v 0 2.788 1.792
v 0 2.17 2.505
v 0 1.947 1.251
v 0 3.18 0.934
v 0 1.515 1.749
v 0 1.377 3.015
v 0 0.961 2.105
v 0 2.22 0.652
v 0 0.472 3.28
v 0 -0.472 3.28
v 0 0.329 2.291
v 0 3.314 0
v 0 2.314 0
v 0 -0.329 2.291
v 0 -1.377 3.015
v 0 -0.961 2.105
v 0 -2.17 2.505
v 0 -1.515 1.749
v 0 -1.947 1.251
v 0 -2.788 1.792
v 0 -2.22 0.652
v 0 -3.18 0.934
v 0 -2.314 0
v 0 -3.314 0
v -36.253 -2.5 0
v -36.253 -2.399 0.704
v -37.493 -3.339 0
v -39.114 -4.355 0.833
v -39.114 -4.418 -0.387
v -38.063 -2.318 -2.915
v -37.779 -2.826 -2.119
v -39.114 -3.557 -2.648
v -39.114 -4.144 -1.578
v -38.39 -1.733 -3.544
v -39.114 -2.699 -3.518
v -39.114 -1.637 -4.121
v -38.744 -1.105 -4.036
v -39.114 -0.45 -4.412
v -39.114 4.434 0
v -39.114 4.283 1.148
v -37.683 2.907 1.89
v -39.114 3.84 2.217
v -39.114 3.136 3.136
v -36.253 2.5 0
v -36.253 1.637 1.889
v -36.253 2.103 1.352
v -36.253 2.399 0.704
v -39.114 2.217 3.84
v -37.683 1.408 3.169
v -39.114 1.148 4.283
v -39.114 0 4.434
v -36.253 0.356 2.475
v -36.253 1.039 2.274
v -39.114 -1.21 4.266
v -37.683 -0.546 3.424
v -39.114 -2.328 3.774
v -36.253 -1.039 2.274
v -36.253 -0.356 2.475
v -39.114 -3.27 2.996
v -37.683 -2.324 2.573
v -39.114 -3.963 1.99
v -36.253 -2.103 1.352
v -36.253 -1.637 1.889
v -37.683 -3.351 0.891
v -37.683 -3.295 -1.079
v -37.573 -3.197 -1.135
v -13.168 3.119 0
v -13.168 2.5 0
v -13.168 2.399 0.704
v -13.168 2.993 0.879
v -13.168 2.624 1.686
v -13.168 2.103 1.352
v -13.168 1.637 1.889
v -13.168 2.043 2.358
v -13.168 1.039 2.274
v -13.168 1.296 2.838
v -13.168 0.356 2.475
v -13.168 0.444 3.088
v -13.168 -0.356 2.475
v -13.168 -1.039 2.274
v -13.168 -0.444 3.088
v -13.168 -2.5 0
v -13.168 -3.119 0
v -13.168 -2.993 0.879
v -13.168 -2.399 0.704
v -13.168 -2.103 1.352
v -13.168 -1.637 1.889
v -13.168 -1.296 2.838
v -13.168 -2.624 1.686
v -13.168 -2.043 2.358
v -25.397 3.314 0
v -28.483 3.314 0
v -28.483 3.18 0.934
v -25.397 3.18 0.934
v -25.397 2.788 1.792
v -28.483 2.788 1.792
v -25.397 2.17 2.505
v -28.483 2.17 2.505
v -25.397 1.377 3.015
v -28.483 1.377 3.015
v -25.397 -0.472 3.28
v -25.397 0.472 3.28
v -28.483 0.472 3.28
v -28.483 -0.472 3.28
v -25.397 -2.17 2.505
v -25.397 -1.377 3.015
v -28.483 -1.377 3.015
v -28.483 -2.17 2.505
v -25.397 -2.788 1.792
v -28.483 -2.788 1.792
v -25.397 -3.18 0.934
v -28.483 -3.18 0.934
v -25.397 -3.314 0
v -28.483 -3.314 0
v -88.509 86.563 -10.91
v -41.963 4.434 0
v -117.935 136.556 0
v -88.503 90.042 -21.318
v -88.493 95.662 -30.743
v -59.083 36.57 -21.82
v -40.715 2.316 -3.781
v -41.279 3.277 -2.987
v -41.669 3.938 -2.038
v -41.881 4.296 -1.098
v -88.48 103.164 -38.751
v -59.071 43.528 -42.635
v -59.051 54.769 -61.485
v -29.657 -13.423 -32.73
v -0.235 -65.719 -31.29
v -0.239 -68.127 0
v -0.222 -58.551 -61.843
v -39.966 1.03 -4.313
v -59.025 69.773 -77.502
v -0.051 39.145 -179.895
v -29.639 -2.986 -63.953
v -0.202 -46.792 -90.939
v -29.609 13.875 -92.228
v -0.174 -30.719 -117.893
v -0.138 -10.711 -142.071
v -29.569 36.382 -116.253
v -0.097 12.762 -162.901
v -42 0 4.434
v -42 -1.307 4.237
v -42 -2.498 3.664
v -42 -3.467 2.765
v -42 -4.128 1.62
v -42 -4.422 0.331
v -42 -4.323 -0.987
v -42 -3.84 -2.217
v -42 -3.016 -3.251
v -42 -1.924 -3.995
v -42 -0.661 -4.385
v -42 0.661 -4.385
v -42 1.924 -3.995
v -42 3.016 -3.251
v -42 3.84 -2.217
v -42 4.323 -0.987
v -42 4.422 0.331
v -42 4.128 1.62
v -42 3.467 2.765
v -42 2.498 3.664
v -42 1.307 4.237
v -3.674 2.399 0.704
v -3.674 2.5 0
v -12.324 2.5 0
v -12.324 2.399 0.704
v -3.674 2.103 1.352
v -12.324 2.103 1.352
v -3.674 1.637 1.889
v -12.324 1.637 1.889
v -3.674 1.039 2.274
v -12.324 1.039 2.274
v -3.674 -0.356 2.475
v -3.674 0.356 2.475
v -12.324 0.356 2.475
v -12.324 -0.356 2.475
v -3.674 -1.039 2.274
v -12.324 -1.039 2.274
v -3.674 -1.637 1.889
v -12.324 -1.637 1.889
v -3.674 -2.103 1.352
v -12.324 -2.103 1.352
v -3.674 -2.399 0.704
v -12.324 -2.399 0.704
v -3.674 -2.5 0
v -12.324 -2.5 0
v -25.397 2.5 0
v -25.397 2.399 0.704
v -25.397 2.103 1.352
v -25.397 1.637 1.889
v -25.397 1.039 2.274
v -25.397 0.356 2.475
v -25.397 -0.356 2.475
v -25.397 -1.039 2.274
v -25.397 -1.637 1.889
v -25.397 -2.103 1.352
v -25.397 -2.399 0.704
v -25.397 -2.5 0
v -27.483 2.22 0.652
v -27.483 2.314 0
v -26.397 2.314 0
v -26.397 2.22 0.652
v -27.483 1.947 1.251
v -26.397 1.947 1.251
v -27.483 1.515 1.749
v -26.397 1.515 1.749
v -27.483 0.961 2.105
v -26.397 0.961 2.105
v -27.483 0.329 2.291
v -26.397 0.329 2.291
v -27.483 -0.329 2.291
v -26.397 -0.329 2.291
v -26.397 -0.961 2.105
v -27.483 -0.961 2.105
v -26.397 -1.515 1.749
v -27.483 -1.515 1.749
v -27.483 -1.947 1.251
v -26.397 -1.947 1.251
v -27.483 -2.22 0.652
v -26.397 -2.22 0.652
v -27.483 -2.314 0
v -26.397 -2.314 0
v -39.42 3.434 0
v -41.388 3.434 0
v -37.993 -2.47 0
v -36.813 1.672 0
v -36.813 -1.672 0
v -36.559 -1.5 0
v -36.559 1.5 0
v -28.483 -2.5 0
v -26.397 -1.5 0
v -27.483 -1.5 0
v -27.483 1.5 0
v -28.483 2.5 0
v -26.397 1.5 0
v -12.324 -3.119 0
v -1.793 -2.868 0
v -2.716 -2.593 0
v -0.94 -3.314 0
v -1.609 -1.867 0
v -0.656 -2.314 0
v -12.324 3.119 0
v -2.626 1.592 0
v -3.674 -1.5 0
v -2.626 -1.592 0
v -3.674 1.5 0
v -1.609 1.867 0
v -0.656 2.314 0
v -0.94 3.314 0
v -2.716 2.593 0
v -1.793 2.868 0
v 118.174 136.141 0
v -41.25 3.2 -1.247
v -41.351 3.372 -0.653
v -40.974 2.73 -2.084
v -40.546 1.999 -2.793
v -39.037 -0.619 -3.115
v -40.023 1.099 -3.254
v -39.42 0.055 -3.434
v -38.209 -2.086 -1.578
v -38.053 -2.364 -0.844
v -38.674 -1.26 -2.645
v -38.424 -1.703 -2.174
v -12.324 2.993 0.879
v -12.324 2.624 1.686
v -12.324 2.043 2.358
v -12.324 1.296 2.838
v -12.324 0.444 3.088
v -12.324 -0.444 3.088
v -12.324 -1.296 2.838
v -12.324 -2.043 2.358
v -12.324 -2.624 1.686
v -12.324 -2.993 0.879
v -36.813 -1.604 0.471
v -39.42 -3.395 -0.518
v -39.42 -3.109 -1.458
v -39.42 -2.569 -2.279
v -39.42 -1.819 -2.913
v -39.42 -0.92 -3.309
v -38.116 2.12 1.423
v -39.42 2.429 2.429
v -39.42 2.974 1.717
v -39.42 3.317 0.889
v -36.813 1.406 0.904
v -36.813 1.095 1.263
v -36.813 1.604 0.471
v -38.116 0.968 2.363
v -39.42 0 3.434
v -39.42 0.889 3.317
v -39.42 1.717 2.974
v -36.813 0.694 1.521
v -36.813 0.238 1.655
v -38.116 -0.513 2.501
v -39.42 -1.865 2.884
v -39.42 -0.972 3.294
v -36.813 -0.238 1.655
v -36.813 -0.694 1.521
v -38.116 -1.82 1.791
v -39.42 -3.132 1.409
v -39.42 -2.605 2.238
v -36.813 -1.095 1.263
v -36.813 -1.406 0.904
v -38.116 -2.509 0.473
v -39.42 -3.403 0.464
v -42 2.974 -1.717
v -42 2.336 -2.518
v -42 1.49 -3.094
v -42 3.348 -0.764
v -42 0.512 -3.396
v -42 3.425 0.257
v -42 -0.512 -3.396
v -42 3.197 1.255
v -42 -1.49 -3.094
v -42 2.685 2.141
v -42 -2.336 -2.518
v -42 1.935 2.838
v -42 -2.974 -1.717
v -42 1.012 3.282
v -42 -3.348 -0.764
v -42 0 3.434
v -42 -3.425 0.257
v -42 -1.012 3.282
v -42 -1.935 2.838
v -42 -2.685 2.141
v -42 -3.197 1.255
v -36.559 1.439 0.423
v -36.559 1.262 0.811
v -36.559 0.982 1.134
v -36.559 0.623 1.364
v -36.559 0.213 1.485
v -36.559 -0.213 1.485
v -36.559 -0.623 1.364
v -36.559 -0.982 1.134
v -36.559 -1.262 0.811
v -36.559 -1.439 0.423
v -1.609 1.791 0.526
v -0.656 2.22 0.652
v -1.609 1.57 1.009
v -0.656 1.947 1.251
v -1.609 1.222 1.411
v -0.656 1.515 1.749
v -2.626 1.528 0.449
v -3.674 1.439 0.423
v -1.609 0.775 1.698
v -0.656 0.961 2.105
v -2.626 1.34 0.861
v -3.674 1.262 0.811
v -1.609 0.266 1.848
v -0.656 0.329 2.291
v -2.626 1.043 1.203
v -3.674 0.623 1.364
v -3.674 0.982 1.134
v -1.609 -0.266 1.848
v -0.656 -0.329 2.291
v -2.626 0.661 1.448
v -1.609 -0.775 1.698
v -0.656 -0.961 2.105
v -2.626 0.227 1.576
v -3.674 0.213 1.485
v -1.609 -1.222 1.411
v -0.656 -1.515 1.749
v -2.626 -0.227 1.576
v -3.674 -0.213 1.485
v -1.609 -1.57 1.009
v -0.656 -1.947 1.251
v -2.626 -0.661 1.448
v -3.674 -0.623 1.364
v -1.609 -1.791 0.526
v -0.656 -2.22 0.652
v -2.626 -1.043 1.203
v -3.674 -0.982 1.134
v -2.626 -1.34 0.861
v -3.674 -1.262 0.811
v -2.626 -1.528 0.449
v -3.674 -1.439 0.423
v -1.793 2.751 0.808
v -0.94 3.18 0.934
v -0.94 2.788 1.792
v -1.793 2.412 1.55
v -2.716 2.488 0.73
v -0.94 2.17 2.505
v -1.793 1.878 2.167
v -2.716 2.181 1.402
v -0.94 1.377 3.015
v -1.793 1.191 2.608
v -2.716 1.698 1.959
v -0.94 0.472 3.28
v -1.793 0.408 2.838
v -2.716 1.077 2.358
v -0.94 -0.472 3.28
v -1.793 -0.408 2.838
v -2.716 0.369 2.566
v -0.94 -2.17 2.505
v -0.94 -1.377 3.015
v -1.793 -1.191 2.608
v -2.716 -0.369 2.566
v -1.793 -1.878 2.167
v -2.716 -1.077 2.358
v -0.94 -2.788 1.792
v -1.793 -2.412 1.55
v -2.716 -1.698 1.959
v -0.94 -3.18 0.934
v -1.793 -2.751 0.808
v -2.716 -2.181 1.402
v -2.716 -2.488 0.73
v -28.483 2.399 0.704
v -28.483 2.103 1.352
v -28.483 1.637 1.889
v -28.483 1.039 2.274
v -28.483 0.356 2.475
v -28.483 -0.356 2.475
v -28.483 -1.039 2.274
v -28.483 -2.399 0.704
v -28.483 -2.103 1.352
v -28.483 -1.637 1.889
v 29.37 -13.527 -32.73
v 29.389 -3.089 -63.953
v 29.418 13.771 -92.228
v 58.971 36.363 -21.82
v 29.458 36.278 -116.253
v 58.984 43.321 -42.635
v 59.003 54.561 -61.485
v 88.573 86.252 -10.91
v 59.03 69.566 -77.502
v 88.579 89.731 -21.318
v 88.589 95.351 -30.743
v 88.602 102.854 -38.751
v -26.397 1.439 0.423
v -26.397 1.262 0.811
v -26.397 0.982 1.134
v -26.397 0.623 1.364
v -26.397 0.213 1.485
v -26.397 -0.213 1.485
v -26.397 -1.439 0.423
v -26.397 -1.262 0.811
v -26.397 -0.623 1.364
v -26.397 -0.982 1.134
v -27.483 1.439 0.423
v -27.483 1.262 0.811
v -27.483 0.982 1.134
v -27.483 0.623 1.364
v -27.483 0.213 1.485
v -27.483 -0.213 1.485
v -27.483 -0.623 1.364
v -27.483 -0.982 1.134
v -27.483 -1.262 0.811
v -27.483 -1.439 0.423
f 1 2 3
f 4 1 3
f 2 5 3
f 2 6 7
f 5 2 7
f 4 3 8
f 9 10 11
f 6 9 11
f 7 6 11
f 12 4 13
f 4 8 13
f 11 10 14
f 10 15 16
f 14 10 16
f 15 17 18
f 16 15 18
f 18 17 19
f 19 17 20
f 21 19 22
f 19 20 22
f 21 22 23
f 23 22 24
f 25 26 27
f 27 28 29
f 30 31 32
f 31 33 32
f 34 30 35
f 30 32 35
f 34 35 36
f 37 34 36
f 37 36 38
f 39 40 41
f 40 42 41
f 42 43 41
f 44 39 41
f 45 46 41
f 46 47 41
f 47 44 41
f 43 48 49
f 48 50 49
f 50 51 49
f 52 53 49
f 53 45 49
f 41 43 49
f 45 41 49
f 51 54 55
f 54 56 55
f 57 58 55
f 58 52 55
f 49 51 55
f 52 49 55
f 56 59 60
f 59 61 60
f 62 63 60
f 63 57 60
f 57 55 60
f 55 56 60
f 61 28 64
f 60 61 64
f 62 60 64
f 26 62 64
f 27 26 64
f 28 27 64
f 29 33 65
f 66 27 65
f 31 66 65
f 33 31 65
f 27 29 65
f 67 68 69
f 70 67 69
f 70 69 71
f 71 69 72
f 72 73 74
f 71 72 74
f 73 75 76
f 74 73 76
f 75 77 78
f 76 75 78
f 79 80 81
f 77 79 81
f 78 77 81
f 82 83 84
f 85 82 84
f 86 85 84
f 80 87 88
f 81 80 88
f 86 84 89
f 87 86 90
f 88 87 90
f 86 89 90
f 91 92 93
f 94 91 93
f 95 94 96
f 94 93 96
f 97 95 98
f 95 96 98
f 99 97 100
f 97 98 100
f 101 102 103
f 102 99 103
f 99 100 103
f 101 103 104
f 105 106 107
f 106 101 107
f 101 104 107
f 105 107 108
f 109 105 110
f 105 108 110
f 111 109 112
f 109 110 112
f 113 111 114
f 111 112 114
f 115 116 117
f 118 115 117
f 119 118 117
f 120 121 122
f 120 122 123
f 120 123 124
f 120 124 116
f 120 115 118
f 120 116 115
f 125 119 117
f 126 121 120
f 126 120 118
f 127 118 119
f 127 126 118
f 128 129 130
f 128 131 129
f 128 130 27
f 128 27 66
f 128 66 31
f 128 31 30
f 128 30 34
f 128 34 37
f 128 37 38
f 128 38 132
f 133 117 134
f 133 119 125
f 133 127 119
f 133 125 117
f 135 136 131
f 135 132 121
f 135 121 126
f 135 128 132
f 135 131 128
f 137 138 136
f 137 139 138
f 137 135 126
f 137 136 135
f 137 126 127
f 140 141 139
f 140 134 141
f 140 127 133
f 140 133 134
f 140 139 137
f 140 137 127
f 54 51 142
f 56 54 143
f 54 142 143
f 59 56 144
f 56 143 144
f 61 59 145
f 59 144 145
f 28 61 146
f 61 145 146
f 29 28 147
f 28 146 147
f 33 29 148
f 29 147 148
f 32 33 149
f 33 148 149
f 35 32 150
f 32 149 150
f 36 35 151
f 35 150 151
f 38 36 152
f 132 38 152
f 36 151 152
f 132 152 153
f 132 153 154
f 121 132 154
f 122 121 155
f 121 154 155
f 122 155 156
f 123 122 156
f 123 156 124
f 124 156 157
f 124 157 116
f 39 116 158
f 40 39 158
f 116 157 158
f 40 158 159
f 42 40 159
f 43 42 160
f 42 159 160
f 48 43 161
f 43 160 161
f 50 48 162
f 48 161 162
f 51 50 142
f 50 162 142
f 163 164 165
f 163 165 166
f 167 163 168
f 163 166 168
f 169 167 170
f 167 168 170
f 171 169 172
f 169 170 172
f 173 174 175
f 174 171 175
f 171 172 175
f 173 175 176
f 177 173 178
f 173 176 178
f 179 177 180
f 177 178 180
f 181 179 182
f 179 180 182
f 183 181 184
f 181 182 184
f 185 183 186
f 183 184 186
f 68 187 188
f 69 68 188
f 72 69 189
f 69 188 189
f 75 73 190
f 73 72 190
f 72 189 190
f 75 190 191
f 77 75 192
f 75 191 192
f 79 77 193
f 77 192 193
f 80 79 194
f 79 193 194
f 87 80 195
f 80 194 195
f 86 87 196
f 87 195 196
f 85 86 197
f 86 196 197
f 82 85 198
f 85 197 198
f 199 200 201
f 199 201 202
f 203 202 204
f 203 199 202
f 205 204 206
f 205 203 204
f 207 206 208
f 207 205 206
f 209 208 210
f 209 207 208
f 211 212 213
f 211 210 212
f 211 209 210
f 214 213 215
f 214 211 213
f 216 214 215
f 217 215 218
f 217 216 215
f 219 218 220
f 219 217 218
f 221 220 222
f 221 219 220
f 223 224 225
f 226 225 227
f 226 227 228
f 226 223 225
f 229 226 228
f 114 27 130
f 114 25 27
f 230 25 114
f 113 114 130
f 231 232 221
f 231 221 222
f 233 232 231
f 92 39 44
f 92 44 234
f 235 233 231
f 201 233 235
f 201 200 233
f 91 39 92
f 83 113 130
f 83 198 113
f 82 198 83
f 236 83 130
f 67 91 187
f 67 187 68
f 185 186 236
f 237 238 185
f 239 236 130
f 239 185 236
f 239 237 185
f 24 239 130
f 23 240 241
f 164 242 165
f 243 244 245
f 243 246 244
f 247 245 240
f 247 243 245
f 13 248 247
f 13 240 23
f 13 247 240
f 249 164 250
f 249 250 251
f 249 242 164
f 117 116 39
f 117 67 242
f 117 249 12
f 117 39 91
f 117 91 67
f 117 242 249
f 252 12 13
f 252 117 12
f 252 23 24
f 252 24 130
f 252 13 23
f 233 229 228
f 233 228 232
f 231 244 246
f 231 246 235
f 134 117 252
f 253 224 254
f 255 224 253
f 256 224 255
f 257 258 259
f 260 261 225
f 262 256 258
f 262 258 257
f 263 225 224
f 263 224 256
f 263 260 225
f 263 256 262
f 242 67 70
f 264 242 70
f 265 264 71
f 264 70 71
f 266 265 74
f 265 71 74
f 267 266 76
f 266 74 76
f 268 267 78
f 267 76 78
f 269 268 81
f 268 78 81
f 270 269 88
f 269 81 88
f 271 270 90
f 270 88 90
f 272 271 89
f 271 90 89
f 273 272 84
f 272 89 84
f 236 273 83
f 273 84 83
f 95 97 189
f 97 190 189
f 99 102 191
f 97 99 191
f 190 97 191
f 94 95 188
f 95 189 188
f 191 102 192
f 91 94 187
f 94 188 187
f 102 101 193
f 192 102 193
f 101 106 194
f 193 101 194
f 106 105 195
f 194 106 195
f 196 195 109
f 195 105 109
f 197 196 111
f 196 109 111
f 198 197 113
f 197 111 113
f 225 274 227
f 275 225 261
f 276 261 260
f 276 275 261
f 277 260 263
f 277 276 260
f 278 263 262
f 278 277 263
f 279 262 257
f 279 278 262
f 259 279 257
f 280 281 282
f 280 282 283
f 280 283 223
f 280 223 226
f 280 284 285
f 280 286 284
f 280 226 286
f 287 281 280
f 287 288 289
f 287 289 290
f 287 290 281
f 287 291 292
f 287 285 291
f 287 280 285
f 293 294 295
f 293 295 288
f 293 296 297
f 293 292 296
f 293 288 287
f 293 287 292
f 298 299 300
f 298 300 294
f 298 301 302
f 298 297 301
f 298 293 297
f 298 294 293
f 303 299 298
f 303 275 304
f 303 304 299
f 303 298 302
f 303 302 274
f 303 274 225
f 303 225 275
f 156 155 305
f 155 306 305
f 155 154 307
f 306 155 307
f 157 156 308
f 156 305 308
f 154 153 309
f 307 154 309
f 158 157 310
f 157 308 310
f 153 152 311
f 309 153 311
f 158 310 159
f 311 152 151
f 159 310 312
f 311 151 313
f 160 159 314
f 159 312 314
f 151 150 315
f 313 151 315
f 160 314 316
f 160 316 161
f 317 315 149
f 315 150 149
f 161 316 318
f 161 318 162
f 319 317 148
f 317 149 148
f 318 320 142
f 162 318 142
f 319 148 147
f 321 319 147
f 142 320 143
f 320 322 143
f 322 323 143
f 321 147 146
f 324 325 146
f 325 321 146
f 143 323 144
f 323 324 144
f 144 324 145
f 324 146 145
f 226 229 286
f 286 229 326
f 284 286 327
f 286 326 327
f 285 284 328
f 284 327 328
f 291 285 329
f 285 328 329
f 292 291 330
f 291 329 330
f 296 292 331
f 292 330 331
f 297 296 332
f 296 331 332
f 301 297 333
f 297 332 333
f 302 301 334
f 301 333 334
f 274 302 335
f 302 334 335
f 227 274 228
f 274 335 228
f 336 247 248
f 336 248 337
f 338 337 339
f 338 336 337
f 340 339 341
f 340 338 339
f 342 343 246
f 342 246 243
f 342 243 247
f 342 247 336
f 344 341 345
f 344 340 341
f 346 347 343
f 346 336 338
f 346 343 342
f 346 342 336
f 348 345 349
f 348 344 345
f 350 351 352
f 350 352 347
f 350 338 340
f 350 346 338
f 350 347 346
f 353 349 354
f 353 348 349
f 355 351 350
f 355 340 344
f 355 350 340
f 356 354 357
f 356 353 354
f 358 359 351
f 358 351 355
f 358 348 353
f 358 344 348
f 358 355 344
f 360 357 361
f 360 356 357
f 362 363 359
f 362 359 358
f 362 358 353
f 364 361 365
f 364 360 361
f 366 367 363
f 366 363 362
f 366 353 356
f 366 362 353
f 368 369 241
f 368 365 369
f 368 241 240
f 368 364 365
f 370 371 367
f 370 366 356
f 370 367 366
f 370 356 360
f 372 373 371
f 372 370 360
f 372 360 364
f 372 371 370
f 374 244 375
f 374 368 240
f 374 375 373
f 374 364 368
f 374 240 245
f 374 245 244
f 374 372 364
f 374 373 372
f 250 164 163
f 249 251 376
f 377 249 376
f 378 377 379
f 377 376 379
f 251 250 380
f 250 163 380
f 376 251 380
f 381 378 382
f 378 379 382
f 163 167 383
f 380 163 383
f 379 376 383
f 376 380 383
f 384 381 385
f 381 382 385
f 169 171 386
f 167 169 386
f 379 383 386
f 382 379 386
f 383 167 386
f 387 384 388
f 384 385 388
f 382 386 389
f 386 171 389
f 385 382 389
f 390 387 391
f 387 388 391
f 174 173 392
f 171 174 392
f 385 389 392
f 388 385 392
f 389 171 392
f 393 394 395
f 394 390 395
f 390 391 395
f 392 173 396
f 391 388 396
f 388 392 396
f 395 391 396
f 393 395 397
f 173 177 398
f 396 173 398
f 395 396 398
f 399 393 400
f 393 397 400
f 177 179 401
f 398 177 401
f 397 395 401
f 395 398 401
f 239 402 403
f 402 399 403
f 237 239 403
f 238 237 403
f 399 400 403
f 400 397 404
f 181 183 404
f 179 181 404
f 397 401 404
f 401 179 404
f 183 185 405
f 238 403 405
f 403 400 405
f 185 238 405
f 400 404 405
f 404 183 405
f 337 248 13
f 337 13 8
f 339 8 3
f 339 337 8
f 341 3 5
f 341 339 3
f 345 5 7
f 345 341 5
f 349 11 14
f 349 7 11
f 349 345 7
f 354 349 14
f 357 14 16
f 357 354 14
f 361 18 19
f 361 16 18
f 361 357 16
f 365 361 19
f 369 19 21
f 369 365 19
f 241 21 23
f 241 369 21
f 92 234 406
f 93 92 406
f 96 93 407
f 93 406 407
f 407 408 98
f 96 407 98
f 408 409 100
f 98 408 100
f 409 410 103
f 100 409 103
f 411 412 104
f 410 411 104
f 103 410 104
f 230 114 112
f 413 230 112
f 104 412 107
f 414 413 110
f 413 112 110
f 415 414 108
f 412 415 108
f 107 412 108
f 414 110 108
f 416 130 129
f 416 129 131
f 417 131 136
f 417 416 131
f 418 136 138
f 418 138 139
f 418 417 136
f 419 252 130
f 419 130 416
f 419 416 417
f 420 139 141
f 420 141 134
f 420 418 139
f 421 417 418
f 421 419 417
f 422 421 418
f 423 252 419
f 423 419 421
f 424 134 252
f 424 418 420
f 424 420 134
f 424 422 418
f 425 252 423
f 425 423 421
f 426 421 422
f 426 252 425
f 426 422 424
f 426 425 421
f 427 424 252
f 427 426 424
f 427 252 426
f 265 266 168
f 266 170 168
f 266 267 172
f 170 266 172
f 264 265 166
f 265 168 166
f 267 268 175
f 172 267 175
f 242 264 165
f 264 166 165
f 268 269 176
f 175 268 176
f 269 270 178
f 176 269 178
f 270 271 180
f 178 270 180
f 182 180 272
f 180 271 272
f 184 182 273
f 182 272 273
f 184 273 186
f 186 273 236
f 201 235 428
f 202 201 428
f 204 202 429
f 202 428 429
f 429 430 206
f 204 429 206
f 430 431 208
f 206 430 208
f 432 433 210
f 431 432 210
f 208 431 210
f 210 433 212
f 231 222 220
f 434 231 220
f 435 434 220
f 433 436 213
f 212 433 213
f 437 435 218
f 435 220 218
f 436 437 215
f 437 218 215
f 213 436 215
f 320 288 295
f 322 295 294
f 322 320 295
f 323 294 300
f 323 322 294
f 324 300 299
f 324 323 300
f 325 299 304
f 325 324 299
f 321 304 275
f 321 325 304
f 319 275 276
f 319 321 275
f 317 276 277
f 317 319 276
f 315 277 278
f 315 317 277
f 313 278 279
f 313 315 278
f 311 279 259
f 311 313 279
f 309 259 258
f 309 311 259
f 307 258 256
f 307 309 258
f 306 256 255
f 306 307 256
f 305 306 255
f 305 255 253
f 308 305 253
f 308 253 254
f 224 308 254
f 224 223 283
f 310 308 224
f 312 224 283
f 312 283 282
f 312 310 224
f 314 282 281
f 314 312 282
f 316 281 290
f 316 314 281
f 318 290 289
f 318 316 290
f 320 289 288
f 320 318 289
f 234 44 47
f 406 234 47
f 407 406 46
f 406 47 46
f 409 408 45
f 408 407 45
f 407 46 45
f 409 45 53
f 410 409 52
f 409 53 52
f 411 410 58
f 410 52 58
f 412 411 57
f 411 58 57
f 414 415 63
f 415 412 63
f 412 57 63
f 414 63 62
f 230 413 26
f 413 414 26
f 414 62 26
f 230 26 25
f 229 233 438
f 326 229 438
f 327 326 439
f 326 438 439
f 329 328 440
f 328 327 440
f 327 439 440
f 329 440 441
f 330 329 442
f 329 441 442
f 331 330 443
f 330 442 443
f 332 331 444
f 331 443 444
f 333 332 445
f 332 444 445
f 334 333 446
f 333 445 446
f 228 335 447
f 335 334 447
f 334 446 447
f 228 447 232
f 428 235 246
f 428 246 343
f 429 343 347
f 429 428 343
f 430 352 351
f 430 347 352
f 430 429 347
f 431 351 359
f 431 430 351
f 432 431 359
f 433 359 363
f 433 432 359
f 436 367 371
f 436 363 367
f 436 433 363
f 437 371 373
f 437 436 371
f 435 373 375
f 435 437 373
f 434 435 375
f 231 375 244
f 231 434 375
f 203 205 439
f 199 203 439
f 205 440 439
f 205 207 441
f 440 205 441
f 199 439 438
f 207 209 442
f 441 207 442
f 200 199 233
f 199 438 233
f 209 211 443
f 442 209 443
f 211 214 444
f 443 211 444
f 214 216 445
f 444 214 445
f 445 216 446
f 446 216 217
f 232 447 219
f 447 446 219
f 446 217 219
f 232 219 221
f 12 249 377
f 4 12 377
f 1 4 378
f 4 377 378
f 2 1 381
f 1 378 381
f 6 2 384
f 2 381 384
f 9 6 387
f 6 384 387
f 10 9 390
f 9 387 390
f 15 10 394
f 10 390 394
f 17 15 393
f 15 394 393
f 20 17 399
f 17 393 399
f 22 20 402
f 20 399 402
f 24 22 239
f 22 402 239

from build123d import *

# Parameters (mm, degrees)
F5_T     = 1
F7_ANGLE = 61.6159971065


# Not quite as in the source:
# - a fillet or chamfer that OpenCascade refuses, or shapes differently, is made with other operations: its cross-section is extruded or revolved along the edge and cut away or added
# - a feature of the source that left no trace in its solid (it failed there, or was rolled back) is left out
# - a shell that OpenCascade refuses in one call is made with other operations: the cavity is built on its own and cut out


with BuildPart() as f1:
    # F0 (on Front) → F1 (revolve)
    with BuildSketch(Plane.XZ):
        Polygon((-42, 4.4344547205), (-42, 0), (0, 0), (0, 3.3141644672), (-0.939540565, 3.3141644672), (-0.939540565, 2.5), (-12.3243089765, 2.5), (-12.3243089765, 3.1194374897), (-13.1681719795, 3.1194374897), (-13.1681719795, 2.5), (-25.396803394, 2.5), (-25.396803394, 3.3141644672), (-28.4831486642, 3.3141644672), (-28.4831486642, 2.5), (-36.2527966499, 2.5), (-39.1136556864, 4.4344547205), align=None)
    revolve(axis=Axis((-21, 0, 0), (1, 0, 0)))

    # F4: fillet of radius 5 on 1 edges, made by hand

    # F4_s1 → F4_t2 (revolve)
    with BuildSketch(Plane.XZ):
        with BuildLine():
            ThreePointArc((-0.939540565, 3.3141644672), (-2.2475981784, 2.7078617683), (-3.6742765472, 2.5))
            Line((-3.6742765472, 2.5), (-0.939540565, 2.5))
            Line((-0.939540565, 2.5), (-0.939540565, 3.3141644672))
        make_face()
    revolve(axis=Axis((-0.939540565, 0, 0), (1, 0, 0)))

    # F5: shell of thickness 1, made by hand


with BuildPart() as f5_core1:
    # F5_t2: copy of F1
    add(f1.part)

    # the walls: a layer under each face that stays
    f5_faces = [f5_core1.faces().sort_by_distance(p)[0] for p in [
        (-40.5568278432, 0, -4.4344547205),
        (-37.6832261682, 0, -3.4672273602),
        (-32.3679726571, 0, -2.5),
        (-28.4831486642, 2.2094429781, -2.2094429781),
        (-26.9399760291, 0, -3.3141644672),
        (-25.396803394, 2.2094429781, 2.2094429781),
        (-19.2824876867, 0, -2.5),
        (-13.1681719795, 2.0796249931, -2.0796249931),
        (-12.746240478, 0, -3.1194374897),
        (-12.3243089765, 2.0796249931, 2.0796249931),
        (-7.9992927619, 0, -2.5),
        (-2.2475981784, 0, -2.7078617683),
        (-0.4697702825, 0, -3.3141644672),
    ]]
    thicken(f5_faces, amount=-F5_T, mode=Mode.SUBTRACT)

    # F5_s3 → F5_t4 (revolve, cut)
    with BuildSketch(Plane.XZ):
        Polygon((-36.2471952097, 2.5182839524), (-36.8129406711, 1.6716047589), (-36.5591549299, 1.5), (-36.2527966499, 1.5), align=None)
    revolve(axis=Axis((-36.2527966499, 0, 0), (1, 0, 0)), mode=Mode.SUBTRACT)

    # F5_s5 → F5_t6 (revolve, cut)
    with BuildSketch(Plane.XZ):
        Polygon((-28.4931486642, 2.51), (-28.4831486642, 1.5), (-27.4831486642, 1.5), (-27.4831486642, 2.5), align=None)
    revolve(axis=Axis((-28.4831486642, 0, 0), (1, 0, 0)), mode=Mode.SUBTRACT)

    # F5_s7 → F5_t8 (revolve, cut)
    with BuildSketch(Plane.XZ):
        Polygon((-25.386803394, 2.51), (-26.396803394, 2.5), (-26.396803394, 1.5), (-25.396803394, 1.5), align=None)
    revolve(axis=Axis((-25.396803394, 0, 0), (1, 0, 0)), mode=Mode.SUBTRACT)

    # F5_s9 → F5_t10 (revolve, cut)
    with BuildSketch(Plane.XZ):
        Polygon((-13.1781719795, 2.51), (-13.1681719795, 1.5), (-12.1681719795, 1.5), (-12.1681719795, 2.5), align=None)
    revolve(axis=Axis((-13.1681719795, 0, 0), (1, 0, 0)), mode=Mode.SUBTRACT)

    # F5_s11 → F5_t12 (revolve, cut)
    with BuildSketch(Plane.XZ):
        Polygon((-12.3143089765, 2.51), (-13.3243089765, 2.5), (-13.3243089765, 1.5), (-12.3243089765, 1.5), align=None)
    revolve(axis=Axis((-12.3243089765, 0, 0), (1, 0, 0)), mode=Mode.SUBTRACT)


with BuildPart() as f1_1:
    add(f1.part)

    # what is left inside the walls is the cavity
    f5_cavity = [f5_core1.part.solids().sort_by_distance(p)[0] for p in [
        (-18.822628, 0, -1.49),
    ]]
    add(f5_cavity, mode=Mode.SUBTRACT)

    # F6 (on Top) → F7 (revolve)
    with BuildSketch(Plane.XY):
        Polygon((-0.2392299093, -68.1274962625), (118.1739337362, 136.1414027413), (-117.9347038269, 136.5557610989), align=None)
    revolve(axis=Axis((0.1196149546, 136.3485819201, 0), (0.9999984601, -0.0017549452, 0)), revolution_arc=F7_ANGLE)


solid = f1_1.part
